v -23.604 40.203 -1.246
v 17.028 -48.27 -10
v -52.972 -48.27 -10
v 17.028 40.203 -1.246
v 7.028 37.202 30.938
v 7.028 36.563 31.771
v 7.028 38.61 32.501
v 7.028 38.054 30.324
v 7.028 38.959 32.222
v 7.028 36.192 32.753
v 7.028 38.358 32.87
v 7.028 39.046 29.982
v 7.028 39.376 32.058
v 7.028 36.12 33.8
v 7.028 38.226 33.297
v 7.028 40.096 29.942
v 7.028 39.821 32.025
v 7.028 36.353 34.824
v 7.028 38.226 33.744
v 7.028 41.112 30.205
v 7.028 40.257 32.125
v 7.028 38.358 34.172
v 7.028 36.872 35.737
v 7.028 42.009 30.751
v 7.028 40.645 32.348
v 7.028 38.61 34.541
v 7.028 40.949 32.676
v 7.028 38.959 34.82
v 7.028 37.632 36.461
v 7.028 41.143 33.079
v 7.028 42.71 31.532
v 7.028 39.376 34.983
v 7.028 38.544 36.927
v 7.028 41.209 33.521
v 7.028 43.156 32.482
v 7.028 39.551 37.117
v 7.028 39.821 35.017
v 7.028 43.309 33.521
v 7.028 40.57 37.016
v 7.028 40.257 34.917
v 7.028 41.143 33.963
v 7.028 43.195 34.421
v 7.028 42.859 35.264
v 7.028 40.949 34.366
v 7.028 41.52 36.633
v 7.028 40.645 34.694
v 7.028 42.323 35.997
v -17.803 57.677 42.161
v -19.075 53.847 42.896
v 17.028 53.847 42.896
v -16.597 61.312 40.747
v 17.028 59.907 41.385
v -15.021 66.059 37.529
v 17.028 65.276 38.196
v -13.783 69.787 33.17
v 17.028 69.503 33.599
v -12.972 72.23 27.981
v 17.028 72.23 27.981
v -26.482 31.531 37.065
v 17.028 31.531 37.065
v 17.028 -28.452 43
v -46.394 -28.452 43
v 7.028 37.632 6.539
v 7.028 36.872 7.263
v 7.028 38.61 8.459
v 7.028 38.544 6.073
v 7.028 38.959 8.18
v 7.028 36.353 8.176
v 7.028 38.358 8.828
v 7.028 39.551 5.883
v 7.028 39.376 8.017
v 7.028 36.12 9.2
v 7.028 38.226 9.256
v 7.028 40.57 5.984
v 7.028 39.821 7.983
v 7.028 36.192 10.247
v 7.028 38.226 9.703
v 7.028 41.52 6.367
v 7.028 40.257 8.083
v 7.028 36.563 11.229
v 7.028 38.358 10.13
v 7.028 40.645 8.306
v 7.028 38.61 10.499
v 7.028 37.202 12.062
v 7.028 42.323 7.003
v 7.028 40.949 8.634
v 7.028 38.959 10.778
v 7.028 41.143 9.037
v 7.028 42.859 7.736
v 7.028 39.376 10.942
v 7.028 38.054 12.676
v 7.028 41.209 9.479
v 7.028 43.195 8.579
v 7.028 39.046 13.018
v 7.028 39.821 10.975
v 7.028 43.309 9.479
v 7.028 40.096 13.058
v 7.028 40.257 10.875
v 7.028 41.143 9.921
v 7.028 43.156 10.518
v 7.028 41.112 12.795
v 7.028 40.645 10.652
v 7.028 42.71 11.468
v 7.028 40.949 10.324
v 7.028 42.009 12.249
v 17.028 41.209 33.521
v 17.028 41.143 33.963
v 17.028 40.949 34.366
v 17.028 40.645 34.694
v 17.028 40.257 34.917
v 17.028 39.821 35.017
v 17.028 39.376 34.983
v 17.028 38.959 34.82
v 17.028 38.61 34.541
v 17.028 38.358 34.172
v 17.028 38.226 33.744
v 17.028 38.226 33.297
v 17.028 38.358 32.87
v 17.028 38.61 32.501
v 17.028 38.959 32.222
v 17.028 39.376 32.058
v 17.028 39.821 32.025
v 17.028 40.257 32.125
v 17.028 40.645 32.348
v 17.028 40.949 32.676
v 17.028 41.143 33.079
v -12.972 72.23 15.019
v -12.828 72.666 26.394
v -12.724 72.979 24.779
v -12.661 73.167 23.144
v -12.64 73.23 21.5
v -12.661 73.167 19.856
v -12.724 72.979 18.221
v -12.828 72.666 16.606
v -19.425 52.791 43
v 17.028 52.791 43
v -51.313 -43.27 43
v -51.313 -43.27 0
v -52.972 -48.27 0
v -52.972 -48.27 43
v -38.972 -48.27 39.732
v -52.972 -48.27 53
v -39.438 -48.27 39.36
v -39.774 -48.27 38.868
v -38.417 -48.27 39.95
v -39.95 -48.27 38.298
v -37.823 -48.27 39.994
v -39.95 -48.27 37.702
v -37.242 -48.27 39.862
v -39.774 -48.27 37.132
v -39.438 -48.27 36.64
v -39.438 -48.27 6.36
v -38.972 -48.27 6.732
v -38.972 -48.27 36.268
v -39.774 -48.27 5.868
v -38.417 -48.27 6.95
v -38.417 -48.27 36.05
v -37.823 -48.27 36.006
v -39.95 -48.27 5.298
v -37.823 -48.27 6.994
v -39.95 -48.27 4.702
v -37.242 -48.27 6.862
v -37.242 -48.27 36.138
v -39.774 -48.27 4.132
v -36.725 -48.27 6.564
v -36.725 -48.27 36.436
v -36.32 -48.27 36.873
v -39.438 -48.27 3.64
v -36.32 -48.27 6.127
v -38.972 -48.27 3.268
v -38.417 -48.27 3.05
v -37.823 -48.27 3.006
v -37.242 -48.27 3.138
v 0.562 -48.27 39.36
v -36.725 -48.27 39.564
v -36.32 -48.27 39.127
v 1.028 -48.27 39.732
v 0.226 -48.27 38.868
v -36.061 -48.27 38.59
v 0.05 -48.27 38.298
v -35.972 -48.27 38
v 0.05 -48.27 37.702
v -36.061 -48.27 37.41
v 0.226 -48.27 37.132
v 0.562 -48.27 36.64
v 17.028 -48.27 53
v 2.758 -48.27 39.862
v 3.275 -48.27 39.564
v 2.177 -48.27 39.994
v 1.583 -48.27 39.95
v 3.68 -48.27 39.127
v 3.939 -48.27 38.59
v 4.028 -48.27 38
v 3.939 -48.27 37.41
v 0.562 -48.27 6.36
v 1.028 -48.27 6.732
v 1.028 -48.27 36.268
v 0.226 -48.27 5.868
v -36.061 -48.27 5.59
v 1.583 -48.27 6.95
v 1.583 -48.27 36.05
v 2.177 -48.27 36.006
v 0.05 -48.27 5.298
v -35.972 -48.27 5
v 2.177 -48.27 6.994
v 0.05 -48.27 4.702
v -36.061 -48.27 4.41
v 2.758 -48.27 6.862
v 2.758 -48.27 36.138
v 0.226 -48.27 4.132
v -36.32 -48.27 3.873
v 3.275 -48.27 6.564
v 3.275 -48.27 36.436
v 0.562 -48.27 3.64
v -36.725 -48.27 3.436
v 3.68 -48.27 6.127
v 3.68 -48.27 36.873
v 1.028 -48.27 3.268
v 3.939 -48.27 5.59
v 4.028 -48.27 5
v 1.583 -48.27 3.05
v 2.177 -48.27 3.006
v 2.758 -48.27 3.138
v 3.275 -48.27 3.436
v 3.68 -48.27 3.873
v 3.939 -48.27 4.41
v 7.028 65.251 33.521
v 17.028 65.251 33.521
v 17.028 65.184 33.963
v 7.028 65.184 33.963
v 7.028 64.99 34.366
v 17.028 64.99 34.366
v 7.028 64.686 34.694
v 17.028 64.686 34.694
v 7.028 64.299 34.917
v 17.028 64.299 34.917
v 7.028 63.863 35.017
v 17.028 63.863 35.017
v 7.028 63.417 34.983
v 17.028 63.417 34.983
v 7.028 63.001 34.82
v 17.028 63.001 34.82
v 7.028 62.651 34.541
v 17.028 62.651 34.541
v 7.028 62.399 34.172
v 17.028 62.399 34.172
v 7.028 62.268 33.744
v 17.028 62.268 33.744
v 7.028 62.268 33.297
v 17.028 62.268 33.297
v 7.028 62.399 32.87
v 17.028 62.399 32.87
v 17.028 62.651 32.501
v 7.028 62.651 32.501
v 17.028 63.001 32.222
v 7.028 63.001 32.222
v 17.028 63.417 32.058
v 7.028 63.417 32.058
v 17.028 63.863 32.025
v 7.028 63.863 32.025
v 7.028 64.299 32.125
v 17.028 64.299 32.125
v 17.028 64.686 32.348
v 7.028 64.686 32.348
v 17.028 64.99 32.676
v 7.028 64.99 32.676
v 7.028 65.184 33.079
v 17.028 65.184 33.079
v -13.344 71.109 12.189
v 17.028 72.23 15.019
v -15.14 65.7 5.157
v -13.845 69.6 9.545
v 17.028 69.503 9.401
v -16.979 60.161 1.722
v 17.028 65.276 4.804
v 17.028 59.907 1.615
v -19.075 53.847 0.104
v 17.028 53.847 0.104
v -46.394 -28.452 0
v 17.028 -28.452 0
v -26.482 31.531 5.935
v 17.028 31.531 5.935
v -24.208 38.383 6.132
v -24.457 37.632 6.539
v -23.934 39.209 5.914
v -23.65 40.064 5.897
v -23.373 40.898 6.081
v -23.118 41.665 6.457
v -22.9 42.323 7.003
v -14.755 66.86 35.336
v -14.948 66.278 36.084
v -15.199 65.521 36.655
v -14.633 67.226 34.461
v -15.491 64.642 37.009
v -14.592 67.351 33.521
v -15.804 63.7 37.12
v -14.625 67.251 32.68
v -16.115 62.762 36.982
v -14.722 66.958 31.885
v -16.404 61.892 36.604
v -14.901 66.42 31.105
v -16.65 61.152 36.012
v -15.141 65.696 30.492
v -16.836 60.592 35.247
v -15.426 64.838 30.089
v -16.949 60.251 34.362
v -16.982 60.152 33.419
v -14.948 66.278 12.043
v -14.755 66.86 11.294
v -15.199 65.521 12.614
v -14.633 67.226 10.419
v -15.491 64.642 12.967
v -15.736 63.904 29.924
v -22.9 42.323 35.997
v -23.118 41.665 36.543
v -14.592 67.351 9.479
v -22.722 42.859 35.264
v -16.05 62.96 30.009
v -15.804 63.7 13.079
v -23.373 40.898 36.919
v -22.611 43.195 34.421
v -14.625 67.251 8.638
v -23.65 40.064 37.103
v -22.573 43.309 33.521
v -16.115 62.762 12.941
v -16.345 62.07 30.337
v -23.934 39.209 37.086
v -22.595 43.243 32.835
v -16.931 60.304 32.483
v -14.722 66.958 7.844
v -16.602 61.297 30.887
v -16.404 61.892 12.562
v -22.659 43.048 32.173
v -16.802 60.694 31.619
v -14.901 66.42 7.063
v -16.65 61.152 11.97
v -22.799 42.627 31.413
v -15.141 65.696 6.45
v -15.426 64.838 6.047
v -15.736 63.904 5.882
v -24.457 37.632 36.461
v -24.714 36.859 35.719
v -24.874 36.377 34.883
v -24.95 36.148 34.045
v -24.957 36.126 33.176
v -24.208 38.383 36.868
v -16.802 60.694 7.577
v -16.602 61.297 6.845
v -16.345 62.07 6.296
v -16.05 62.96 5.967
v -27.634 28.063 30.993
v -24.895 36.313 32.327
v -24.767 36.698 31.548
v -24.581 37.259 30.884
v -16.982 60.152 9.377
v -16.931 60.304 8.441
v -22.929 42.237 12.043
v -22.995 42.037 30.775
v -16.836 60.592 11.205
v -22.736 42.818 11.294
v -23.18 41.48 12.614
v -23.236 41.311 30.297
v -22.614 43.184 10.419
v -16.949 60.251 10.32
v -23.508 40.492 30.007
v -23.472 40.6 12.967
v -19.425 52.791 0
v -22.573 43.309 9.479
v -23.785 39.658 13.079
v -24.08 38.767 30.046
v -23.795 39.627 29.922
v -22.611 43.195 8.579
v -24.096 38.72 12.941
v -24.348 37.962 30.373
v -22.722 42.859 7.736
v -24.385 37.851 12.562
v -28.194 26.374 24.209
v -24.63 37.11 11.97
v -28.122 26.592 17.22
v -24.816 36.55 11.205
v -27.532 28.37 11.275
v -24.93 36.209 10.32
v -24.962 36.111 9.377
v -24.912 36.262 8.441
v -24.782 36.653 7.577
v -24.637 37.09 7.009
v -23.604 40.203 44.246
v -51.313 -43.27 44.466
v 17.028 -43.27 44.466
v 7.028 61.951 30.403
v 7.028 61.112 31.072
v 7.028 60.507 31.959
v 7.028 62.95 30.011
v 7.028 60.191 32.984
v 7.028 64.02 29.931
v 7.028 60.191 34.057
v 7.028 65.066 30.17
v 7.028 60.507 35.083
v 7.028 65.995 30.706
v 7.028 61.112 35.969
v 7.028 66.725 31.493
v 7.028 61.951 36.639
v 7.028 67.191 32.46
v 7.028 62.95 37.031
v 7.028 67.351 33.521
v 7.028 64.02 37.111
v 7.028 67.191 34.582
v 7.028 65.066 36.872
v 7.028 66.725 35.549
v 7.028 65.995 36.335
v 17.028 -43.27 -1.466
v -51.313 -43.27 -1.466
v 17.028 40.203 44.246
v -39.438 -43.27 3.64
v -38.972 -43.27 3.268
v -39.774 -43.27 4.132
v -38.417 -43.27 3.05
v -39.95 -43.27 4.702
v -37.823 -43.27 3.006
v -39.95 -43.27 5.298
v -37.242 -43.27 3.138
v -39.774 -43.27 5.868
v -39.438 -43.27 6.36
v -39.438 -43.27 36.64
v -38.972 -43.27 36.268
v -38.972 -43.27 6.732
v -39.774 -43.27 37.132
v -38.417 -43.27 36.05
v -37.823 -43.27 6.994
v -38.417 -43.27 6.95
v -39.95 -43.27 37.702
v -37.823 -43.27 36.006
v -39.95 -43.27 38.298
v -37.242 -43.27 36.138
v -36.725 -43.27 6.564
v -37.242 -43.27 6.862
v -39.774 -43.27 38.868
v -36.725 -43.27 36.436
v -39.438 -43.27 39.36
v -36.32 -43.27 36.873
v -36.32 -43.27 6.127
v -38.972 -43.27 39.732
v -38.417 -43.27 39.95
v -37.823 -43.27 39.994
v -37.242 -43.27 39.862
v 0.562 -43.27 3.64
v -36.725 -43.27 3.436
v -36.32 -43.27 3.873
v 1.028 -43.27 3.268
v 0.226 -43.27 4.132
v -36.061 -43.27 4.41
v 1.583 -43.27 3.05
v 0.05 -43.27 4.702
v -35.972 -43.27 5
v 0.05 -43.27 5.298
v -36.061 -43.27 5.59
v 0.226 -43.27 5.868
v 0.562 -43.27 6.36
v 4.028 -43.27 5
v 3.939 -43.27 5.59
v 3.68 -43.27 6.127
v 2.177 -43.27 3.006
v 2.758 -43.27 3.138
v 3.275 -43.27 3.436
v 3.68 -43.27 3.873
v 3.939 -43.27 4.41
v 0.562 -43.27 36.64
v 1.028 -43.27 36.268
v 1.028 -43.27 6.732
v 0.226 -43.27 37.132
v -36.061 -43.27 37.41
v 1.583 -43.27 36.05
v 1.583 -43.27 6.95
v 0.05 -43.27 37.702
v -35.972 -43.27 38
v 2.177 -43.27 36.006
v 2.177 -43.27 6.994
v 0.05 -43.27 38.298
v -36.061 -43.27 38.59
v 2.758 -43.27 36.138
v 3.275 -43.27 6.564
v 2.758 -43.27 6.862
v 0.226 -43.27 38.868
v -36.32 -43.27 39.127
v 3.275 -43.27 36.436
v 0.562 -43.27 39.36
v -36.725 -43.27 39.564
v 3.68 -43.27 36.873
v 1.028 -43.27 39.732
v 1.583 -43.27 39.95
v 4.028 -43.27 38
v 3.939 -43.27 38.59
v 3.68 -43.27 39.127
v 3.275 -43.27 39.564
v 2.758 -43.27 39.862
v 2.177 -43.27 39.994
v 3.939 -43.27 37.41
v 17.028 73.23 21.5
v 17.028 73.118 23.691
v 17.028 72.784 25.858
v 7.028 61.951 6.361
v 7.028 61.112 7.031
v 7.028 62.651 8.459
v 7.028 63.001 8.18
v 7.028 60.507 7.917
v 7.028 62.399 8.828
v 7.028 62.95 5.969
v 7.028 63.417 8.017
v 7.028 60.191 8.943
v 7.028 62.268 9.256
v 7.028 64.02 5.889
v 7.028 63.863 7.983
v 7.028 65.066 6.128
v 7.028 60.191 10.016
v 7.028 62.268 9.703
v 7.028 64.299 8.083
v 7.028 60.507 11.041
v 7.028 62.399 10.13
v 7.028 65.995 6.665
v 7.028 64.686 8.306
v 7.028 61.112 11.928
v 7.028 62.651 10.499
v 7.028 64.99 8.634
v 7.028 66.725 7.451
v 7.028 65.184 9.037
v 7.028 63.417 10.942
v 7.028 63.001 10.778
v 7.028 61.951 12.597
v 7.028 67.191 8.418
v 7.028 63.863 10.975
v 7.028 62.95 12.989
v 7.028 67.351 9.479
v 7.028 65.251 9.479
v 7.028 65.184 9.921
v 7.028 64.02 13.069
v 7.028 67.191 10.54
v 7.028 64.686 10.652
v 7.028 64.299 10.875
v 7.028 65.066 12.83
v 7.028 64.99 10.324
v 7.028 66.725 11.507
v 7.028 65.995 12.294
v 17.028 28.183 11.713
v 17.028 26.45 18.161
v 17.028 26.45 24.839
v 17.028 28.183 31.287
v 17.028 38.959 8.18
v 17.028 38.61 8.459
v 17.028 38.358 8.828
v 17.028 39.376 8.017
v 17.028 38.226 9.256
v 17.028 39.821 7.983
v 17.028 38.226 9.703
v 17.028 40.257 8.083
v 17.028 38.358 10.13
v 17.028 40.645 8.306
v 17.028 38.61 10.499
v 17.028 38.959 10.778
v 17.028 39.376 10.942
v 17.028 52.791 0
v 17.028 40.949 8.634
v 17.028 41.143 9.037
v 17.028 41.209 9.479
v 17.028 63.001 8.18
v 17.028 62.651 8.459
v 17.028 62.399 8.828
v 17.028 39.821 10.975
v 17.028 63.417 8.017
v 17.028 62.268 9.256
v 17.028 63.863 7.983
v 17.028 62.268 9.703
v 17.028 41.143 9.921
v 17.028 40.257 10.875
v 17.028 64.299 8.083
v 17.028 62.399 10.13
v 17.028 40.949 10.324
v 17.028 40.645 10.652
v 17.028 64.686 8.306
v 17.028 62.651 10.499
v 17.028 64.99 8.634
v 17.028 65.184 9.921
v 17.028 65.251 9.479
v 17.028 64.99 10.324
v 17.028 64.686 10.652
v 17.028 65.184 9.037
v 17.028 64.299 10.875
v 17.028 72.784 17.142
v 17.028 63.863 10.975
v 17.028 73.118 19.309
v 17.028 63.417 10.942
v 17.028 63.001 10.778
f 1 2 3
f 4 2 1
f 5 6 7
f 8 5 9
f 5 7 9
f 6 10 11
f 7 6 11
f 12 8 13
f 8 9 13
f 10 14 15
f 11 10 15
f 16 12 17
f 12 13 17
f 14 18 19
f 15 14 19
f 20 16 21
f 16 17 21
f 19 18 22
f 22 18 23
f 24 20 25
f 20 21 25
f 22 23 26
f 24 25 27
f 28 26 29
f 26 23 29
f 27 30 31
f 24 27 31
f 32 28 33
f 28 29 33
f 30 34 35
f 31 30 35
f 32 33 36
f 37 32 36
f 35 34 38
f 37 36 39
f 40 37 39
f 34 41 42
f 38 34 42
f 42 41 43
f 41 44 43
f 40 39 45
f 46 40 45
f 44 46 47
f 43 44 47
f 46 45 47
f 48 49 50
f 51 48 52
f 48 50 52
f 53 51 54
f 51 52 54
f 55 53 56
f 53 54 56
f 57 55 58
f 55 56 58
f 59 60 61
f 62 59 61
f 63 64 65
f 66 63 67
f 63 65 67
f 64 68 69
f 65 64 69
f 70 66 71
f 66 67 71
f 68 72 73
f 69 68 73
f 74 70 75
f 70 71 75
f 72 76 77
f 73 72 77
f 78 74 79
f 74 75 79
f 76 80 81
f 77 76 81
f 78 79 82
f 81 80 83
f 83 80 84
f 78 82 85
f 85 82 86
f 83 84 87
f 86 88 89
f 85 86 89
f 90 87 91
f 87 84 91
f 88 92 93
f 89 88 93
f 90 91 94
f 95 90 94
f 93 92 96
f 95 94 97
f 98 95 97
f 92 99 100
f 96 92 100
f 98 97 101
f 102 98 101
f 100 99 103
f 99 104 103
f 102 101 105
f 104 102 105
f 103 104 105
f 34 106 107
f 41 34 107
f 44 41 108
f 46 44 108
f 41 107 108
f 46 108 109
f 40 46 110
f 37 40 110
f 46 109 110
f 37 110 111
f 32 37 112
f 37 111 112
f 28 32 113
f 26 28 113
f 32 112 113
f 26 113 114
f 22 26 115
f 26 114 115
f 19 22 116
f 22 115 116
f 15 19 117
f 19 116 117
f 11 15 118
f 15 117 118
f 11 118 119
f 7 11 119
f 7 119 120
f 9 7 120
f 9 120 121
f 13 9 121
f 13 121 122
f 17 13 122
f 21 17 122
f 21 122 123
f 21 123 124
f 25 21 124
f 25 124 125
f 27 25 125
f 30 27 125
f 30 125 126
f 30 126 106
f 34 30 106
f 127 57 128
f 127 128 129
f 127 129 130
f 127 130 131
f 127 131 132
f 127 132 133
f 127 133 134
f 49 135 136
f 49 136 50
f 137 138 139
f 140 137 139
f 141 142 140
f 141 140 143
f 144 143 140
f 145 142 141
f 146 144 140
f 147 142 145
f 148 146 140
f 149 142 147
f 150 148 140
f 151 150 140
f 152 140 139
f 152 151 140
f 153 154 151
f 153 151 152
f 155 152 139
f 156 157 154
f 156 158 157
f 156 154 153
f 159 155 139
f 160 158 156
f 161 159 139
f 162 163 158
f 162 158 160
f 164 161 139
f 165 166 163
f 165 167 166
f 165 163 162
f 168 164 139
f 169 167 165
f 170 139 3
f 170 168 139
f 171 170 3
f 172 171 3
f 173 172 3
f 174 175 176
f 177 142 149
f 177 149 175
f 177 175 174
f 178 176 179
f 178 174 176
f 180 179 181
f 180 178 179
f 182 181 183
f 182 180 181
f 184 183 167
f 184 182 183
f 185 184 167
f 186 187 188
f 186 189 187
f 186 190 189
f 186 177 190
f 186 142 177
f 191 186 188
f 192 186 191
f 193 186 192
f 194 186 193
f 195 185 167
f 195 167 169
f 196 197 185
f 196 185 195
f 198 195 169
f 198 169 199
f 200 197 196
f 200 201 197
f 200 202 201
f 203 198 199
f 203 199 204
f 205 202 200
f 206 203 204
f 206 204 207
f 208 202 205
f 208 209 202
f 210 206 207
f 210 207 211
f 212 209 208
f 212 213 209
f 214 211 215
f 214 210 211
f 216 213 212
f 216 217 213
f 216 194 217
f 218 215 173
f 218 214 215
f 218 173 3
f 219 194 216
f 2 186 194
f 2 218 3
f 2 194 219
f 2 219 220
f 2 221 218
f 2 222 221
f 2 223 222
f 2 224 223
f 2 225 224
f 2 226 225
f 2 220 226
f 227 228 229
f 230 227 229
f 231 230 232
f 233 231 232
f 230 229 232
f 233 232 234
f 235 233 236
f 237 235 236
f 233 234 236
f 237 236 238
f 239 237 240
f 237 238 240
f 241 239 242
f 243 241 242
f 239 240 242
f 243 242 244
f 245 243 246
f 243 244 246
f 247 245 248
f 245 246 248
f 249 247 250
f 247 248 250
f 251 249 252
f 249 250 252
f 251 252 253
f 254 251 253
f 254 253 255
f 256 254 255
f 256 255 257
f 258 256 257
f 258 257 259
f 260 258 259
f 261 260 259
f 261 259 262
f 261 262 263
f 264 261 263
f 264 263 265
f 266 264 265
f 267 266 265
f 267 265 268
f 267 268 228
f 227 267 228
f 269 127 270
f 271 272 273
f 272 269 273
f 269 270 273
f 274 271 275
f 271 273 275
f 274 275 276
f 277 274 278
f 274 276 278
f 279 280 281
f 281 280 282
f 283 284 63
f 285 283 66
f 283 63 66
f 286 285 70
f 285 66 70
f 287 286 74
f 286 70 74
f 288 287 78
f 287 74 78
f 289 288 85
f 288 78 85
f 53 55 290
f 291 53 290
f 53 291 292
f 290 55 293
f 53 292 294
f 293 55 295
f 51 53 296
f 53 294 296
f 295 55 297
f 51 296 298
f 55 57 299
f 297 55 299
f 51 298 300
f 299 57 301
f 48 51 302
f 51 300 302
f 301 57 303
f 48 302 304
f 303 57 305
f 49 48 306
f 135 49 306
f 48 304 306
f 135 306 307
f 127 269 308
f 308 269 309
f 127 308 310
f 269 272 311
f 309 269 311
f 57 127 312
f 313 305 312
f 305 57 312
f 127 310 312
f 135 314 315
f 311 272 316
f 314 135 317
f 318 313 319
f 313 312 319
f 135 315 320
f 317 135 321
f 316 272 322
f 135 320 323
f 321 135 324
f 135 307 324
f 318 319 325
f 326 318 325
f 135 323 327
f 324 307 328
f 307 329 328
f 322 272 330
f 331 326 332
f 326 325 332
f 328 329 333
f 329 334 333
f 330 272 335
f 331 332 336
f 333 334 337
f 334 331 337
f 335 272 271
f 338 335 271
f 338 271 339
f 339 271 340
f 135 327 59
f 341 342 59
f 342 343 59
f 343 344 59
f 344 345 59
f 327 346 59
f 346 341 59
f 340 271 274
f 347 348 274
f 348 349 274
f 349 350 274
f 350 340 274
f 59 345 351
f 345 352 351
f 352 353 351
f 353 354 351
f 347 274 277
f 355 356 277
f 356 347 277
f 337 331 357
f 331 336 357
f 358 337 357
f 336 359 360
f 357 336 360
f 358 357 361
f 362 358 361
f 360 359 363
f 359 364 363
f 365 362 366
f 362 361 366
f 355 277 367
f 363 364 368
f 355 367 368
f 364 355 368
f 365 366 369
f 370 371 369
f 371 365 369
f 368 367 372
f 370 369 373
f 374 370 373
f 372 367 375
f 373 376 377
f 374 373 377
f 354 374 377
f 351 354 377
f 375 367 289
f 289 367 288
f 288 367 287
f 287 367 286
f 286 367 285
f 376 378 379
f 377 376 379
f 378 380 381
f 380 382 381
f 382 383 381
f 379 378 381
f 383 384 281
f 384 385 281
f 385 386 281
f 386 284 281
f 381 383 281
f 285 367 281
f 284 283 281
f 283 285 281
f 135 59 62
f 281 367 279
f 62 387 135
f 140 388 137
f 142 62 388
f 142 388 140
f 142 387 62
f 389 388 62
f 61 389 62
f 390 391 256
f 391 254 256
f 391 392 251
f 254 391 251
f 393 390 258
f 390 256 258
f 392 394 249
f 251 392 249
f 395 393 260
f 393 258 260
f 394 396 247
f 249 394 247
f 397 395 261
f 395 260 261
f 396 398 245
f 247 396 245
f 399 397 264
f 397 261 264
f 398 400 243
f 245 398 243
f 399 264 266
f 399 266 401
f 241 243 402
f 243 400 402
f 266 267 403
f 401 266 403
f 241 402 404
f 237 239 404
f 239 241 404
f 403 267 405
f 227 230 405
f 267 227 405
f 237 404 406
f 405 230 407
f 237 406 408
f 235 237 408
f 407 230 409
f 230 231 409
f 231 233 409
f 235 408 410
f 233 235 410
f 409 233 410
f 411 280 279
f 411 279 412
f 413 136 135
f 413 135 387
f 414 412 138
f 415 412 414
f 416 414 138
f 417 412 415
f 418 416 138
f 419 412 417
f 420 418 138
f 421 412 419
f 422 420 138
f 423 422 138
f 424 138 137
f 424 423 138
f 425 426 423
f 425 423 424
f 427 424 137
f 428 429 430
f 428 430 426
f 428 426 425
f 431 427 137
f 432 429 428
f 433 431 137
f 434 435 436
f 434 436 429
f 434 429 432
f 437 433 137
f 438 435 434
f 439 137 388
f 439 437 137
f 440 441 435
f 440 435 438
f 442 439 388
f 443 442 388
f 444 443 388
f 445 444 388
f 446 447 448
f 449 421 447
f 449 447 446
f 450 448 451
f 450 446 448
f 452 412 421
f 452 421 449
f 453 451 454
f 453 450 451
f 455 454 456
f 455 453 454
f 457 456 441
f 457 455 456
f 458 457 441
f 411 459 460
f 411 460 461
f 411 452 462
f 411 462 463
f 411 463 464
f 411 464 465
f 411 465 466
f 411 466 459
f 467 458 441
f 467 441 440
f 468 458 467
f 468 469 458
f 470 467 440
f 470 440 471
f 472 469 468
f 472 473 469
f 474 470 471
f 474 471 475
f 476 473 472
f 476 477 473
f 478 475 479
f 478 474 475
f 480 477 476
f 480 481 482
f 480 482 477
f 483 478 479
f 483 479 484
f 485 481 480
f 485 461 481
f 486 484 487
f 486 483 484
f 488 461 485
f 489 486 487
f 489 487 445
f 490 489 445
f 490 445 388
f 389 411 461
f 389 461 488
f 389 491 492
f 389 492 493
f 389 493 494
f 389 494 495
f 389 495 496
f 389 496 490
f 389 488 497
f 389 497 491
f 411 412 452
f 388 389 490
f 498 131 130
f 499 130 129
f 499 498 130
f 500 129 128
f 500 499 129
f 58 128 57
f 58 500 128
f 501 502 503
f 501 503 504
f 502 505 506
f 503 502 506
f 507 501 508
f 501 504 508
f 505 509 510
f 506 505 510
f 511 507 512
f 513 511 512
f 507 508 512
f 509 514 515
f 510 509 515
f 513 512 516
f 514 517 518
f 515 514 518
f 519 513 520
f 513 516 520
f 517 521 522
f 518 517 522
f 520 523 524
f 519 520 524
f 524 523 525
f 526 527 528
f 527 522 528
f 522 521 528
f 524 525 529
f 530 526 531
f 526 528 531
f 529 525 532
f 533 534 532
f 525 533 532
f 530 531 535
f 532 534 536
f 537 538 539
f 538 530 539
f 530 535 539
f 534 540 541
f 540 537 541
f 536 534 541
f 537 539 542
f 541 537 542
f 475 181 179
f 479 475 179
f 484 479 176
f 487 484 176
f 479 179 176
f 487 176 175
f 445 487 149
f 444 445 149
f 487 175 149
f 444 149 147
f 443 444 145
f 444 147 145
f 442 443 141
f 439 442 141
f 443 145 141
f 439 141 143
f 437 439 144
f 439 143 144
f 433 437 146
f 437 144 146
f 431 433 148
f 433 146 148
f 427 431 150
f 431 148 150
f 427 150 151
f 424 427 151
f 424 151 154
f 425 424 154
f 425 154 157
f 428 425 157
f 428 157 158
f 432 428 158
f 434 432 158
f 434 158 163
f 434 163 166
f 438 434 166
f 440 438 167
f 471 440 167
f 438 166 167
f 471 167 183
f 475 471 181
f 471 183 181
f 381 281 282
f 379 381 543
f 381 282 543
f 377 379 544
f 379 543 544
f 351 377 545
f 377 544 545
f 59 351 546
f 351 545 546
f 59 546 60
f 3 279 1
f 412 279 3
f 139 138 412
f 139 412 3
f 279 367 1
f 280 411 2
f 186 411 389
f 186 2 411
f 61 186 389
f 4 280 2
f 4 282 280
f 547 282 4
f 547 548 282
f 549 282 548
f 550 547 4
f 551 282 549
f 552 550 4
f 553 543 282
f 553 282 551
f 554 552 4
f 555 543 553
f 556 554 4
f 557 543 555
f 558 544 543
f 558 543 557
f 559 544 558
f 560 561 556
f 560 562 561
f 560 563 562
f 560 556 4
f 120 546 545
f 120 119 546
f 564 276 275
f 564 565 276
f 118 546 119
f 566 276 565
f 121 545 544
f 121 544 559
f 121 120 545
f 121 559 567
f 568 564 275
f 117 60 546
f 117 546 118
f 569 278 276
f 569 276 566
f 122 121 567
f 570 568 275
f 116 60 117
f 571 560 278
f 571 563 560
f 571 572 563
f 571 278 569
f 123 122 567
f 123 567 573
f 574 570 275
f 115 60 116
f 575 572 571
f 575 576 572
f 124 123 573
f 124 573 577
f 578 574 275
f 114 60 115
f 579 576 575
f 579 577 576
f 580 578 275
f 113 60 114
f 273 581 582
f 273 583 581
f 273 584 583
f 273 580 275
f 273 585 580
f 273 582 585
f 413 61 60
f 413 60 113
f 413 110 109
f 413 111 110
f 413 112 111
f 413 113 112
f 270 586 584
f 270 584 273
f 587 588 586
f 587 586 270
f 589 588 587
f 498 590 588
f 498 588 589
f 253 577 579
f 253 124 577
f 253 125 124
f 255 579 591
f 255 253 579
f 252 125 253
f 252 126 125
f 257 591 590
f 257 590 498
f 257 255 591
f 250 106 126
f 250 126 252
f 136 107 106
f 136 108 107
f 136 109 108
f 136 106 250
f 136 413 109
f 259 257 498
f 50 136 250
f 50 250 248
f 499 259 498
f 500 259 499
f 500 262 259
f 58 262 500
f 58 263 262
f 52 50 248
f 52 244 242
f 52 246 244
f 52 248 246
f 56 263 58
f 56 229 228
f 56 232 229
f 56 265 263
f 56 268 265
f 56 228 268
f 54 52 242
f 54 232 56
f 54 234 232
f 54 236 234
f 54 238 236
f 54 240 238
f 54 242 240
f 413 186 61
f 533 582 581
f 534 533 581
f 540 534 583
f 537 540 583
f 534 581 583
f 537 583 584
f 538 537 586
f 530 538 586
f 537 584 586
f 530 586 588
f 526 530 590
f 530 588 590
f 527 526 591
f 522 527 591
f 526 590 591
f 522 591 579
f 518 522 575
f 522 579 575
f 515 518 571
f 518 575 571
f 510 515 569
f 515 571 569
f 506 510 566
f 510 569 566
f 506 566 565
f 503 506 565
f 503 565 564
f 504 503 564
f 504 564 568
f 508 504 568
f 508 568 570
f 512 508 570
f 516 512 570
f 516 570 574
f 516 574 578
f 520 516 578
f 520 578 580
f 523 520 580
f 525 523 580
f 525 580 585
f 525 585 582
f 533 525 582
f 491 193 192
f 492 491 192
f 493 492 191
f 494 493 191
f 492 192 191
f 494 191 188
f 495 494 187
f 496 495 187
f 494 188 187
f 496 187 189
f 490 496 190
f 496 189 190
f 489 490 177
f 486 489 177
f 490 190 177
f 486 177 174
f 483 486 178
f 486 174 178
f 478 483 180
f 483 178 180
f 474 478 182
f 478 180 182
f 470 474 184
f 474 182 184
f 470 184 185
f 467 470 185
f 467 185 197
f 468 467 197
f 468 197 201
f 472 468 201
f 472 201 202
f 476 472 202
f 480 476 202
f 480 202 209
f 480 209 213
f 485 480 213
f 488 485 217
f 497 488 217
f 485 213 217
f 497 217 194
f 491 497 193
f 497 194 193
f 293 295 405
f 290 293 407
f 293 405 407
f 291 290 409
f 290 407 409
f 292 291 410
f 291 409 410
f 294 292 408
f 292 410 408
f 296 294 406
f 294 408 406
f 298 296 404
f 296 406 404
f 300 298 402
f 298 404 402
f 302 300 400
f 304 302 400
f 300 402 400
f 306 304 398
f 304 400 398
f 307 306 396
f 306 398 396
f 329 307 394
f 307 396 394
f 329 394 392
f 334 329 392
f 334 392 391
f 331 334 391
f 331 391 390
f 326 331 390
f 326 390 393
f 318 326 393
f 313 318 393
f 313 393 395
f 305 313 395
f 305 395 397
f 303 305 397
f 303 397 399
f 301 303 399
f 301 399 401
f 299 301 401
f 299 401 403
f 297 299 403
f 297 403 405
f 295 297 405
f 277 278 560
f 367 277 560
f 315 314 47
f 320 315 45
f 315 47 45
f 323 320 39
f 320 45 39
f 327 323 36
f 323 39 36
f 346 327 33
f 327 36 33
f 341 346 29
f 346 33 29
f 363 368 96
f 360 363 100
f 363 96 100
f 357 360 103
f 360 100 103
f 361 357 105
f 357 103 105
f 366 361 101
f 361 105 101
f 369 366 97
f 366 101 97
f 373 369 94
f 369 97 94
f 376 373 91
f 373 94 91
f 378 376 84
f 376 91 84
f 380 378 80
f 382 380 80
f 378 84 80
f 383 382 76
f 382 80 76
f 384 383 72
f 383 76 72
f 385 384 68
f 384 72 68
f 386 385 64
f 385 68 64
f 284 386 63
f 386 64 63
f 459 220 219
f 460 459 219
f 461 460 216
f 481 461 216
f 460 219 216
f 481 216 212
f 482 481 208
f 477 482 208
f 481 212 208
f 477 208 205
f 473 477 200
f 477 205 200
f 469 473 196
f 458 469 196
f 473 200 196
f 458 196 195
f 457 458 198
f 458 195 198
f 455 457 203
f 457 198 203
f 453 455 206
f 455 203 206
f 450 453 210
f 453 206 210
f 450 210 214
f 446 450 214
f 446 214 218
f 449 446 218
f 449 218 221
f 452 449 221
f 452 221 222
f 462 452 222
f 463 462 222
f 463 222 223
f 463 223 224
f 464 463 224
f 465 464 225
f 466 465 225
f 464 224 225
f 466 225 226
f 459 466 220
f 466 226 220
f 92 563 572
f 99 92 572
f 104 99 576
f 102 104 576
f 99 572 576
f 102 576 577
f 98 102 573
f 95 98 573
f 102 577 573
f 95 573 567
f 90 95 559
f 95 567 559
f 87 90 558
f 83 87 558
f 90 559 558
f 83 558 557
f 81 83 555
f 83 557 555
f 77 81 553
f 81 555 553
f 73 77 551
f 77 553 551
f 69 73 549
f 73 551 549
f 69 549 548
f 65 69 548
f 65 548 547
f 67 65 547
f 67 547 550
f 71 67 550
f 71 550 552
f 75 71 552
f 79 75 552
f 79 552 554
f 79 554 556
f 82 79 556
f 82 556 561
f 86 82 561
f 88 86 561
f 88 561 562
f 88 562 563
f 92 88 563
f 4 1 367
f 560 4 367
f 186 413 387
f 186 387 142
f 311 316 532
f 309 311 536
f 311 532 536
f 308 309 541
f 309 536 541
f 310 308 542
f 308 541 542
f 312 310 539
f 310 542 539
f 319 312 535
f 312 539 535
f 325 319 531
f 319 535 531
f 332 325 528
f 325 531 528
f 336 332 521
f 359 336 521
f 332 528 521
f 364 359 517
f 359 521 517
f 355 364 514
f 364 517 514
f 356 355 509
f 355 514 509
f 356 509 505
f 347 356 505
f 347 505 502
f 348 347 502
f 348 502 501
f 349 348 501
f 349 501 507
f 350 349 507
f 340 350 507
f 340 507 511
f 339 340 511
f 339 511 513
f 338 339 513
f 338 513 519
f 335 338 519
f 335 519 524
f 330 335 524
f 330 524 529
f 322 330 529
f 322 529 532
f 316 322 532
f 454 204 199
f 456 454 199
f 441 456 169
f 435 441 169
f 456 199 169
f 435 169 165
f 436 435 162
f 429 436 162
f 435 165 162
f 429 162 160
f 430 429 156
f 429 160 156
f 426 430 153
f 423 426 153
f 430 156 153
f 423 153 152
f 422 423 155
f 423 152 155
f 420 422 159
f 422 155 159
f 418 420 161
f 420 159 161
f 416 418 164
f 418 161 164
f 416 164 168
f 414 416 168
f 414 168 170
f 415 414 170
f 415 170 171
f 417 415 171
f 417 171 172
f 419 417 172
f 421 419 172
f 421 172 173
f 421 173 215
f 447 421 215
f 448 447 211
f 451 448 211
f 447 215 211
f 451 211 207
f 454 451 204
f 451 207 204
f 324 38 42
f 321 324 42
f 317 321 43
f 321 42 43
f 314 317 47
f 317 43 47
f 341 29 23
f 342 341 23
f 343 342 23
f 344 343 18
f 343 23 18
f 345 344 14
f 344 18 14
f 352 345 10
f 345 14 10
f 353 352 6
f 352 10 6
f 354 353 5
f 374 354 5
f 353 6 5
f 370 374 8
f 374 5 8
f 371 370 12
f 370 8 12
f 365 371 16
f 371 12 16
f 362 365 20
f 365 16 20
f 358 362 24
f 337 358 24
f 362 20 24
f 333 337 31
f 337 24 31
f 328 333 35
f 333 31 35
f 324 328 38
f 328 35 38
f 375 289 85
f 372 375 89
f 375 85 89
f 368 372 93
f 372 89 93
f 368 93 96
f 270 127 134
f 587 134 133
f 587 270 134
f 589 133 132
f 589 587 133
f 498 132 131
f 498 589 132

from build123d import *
from build123d import SkipClean  # not in build123d's __all__

# Parameters (mm, degrees)
F1_DEPTH = 43
F2_R     = 1.5
F3_DEPTH = 76.2
F4_REACH = 159.0367669999
F5_R     = 2
F6_DEPTH = 5
F7_START = -10
F2_R_2   = 3.6
F7_DEPTH = 40


with BuildPart() as f1:
    # F0 (on Top) → F1 (new body)
    with BuildSketch(Plane.XY):
        Polygon((17.0276526734, -48.2698833057), (17.0276526734, 72.2301166943), (-12.9723473266, 72.2301166943), (-52.9723473266, -48.2698833057), align=None)
    extrude(amount=F1_DEPTH)

    # F2 (on face) → F3 (cut)
    with BuildSketch(Plane.YZ.offset(17.0276526734)):
        with Locations((63.7509319745, 9.4791847198)):
            Circle(F2_R)
        with Locations((63.7509319745, 33.5208152802)):
            Circle(F2_R)
        with Locations((39.7093014141, 33.5208152802)):
            Circle(F2_R)
        with Locations((39.7093014141, 9.4791847198)):
            Circle(F2_R)
        with BuildLine():
            Line((72.2301166943, 36.6657508881), (72.2301166943, 43))
            Line((72.2301166943, 43), (65.4414258951, 43))
            ThreePointArc((65.4414258951, 43), (69.1264984233, 40.1444603767), (72.2301166943, 36.6657508881))
        make_face()
        with BuildLine():
            Line((72.2301166943, 0), (72.2301166943, 6.3342491119))
            ThreePointArc((72.2301166943, 6.3342491119), (69.1264984233, 2.8555396233), (65.4414258951, 0))
            Line((65.4414258951, 0), (72.2301166943, 0))
        make_face()
        with BuildLine():
            ThreePointArc((31.5312779311, 5.93539552), (26.2301166943, 21.5), (31.5312779311, 37.06460448))
            Line((31.5312779311, 37.06460448), (-28.4524949389, 43))
            Line((-28.4524949389, 43), (-43.2698833057, 43))
            Line((-43.2698833057, 43), (-43.2698833057, 0))
            Line((-43.2698833057, 0), (-28.4524949389, 0))
            Line((-28.4524949389, 0), (31.5312779311, 5.93539552))
        make_face()
        with BuildLine():
            ThreePointArc((72.2301166943, 36.6657508881), (69.1264984233, 40.1444603767), (65.4414258951, 43))
            Line((65.4414258951, 43), (52.7912383465, 43))
            Line((52.7912383465, 43), (53.8472030595, 42.8955122706))
            ThreePointArc((53.8472030595, 42.8955122706), (65.276177069, 38.1959350838), (72.2301166943, 27.9807406984))
            Line((72.2301166943, 27.9807406984), (72.2301166943, 36.6657508881))
        make_face()
        with BuildLine():
            Line((72.2301166943, 6.3342491119), (72.2301166943, 15.0192593016))
            ThreePointArc((72.2301166943, 15.0192593016), (65.276177069, 4.8040649162), (53.8472030595, 0.1044877294))
            Line((53.8472030595, 0.1044877294), (52.7912383465, 0))
            Line((52.7912383465, 0), (65.4414258951, 0))
            ThreePointArc((65.4414258951, 0), (69.1264984233, 2.8555396233), (72.2301166943, 6.3342491119))
        make_face()
    extrude(amount=-F3_DEPTH, mode=Mode.SUBTRACT)

    f4_end = Plane(origin=(-22.9147509124, 42.2786258919, 21.5), x_dir=(-0.3150460979, -0.94907637, 0), z_dir=(-0.94907637, 0.3150460979, 0))
    # F2 (on face) → F4 (join, up to a plane its end follows)
    with BuildSketch(Plane.YZ.offset(17.0276526734)):
        Polygon((-43.2698833057, 0), (-48.2698833057, 0), (-48.2698833057, -1.9609309735), (-43.2698833057, -1.466180874), align=None)
        with BuildLine():
            Line((-48.2698833057, -10), (40.2025293734, -1.2456530036))
            ThreePointArc((40.2025293734, -1.2456530036), (39.0953081378, -0.6497542366), (38.0188074935, 0))
            Line((38.0188074935, 0), (-28.4524949389, 0))
            Line((-28.4524949389, 0), (-43.2698833057, -1.466180874))
            Line((-43.2698833057, -1.466180874), (-48.2698833057, -1.9609309735))
            Line((-48.2698833057, -1.9609309735), (-48.2698833057, -10))
        make_face()
        Polygon((-43.2698833057, 44.466180874), (-48.2698833057, 44.9609309735), (-48.2698833057, 43), (-43.2698833057, 43), align=None)
        with BuildLine():
            ThreePointArc((38.0188074935, 43), (39.0953081378, 43.6497542366), (40.2025293734, 44.2456530036))
            Line((40.2025293734, 44.2456530036), (-48.2698833057, 53))
            Line((-48.2698833057, 53), (-48.2698833057, 44.9609309735))
            Line((-48.2698833057, 44.9609309735), (-43.2698833057, 44.466180874))
            Line((-43.2698833057, 44.466180874), (-28.4524949389, 43))
            Line((-28.4524949389, 43), (38.0188074935, 43))
        make_face()
        with BuildLine():
            Line((51.7301166943, 43), (52.7912383465, 43))
            Line((52.7912383465, 43), (40.2025293734, 44.2456530036))
            ThreePointArc((40.2025293734, 44.2456530036), (39.0953081378, 43.6497542366), (38.0188074935, 43))
            Line((38.0188074935, 43), (51.7301166943, 43))
        make_face()
        with BuildLine():
            Line((52.7912383465, 0), (51.7301166943, 0))
            Line((51.7301166943, 0), (38.0188074935, 0))
            ThreePointArc((38.0188074935, 0), (39.0953081378, -0.6497542366), (40.2025293734, -1.2456530036))
            Line((40.2025293734, -1.2456530036), (52.7912383465, 0))
        make_face()
        with BuildLine():
            ThreePointArc((73.2301166943, 21.5), (72.9786460552, 24.7787192622), (72.2301166943, 27.9807406984))
            Line((72.2301166943, 27.9807406984), (72.2301166943, 15.0192593016))
            ThreePointArc((72.2301166943, 15.0192593016), (72.9786460552, 18.2212807378), (73.2301166943, 21.5))
        make_face()
    f4_long = extrude(amount=-F4_REACH, mode=Mode.PRIVATE)
    add(split(f4_long, bisect_by=f4_end, keep=Keep.BOTTOM, mode=Mode.PRIVATE))

    # F5 (on face) → F6 (cut)
    with BuildSketch(Plane.XZ.offset(48.2698833057)):
        with Locations((2.0276526734, 5)):
            Circle(F5_R)
        with Locations((2.0276526734, 38)):
            Circle(F5_R)
        with Locations((-37.9723473266, 38)):
            Circle(F5_R)
        with Locations((-37.9723473266, 5)):
            Circle(F5_R)
    extrude(amount=-F6_DEPTH, mode=Mode.SUBTRACT)

    # F2 (on face) → F7 (cut)
    with BuildSketch(Plane.YZ.offset(17.0276526734).offset(F7_START)):
        with Locations((63.7509319745, 33.5208152802)):
            Circle(F2_R_2)
        with Locations((63.7509319745, 33.5208152802)):
            Circle(F2_R, mode=Mode.SUBTRACT)
        with BuildLine():
            Line((42.3226328457, 35.9967996963), (37.6318949116, 36.4609483083))
            ThreePointArc((37.6318949116, 36.4609483083), (38.0538050247, 30.3240463325), (43.3093014141, 33.5208152802))
            ThreePointArc((43.3093014141, 33.5208152802), (43.0535496969, 34.8534830644), (42.3226328457, 35.9967996963))
        make_face()
        with Locations((39.7093014141, 33.5208152802)):
            Circle(F2_R, mode=Mode.SUBTRACT)
        with BuildLine():
            ThreePointArc((42.3226328457, 35.9967996963), (40.0637902939, 37.1033196604), (37.6318949116, 36.4609483083))
            Line((37.6318949116, 36.4609483083), (42.3226328457, 35.9967996963))
        make_face()
        with BuildLine():
            Line((42.3226328457, 7.0032003037), (37.6318949116, 6.5390516917))
            ThreePointArc((37.6318949116, 6.5390516917), (40.0637902939, 5.8966803396), (42.3226328457, 7.0032003037))
        make_face()
        with BuildLine():
            ThreePointArc((43.3093014141, 9.4791847198), (38.0538050247, 12.6759536675), (37.6318949116, 6.5390516917))
            Line((37.6318949116, 6.5390516917), (42.3226328457, 7.0032003037))
            ThreePointArc((42.3226328457, 7.0032003037), (43.0535496969, 8.1465169356), (43.3093014141, 9.4791847198))
        make_face()
        with Locations((39.7093014141, 9.4791847198)):
            Circle(F2_R, mode=Mode.SUBTRACT)
        with Locations((63.7509319745, 9.4791847198)):
            Circle(F2_R_2)
        with Locations((63.7509319745, 9.4791847198)):
            Circle(F2_R, mode=Mode.SUBTRACT)
    extrude(amount=-F7_DEPTH, mode=Mode.SUBTRACT)


solid = f1.part
